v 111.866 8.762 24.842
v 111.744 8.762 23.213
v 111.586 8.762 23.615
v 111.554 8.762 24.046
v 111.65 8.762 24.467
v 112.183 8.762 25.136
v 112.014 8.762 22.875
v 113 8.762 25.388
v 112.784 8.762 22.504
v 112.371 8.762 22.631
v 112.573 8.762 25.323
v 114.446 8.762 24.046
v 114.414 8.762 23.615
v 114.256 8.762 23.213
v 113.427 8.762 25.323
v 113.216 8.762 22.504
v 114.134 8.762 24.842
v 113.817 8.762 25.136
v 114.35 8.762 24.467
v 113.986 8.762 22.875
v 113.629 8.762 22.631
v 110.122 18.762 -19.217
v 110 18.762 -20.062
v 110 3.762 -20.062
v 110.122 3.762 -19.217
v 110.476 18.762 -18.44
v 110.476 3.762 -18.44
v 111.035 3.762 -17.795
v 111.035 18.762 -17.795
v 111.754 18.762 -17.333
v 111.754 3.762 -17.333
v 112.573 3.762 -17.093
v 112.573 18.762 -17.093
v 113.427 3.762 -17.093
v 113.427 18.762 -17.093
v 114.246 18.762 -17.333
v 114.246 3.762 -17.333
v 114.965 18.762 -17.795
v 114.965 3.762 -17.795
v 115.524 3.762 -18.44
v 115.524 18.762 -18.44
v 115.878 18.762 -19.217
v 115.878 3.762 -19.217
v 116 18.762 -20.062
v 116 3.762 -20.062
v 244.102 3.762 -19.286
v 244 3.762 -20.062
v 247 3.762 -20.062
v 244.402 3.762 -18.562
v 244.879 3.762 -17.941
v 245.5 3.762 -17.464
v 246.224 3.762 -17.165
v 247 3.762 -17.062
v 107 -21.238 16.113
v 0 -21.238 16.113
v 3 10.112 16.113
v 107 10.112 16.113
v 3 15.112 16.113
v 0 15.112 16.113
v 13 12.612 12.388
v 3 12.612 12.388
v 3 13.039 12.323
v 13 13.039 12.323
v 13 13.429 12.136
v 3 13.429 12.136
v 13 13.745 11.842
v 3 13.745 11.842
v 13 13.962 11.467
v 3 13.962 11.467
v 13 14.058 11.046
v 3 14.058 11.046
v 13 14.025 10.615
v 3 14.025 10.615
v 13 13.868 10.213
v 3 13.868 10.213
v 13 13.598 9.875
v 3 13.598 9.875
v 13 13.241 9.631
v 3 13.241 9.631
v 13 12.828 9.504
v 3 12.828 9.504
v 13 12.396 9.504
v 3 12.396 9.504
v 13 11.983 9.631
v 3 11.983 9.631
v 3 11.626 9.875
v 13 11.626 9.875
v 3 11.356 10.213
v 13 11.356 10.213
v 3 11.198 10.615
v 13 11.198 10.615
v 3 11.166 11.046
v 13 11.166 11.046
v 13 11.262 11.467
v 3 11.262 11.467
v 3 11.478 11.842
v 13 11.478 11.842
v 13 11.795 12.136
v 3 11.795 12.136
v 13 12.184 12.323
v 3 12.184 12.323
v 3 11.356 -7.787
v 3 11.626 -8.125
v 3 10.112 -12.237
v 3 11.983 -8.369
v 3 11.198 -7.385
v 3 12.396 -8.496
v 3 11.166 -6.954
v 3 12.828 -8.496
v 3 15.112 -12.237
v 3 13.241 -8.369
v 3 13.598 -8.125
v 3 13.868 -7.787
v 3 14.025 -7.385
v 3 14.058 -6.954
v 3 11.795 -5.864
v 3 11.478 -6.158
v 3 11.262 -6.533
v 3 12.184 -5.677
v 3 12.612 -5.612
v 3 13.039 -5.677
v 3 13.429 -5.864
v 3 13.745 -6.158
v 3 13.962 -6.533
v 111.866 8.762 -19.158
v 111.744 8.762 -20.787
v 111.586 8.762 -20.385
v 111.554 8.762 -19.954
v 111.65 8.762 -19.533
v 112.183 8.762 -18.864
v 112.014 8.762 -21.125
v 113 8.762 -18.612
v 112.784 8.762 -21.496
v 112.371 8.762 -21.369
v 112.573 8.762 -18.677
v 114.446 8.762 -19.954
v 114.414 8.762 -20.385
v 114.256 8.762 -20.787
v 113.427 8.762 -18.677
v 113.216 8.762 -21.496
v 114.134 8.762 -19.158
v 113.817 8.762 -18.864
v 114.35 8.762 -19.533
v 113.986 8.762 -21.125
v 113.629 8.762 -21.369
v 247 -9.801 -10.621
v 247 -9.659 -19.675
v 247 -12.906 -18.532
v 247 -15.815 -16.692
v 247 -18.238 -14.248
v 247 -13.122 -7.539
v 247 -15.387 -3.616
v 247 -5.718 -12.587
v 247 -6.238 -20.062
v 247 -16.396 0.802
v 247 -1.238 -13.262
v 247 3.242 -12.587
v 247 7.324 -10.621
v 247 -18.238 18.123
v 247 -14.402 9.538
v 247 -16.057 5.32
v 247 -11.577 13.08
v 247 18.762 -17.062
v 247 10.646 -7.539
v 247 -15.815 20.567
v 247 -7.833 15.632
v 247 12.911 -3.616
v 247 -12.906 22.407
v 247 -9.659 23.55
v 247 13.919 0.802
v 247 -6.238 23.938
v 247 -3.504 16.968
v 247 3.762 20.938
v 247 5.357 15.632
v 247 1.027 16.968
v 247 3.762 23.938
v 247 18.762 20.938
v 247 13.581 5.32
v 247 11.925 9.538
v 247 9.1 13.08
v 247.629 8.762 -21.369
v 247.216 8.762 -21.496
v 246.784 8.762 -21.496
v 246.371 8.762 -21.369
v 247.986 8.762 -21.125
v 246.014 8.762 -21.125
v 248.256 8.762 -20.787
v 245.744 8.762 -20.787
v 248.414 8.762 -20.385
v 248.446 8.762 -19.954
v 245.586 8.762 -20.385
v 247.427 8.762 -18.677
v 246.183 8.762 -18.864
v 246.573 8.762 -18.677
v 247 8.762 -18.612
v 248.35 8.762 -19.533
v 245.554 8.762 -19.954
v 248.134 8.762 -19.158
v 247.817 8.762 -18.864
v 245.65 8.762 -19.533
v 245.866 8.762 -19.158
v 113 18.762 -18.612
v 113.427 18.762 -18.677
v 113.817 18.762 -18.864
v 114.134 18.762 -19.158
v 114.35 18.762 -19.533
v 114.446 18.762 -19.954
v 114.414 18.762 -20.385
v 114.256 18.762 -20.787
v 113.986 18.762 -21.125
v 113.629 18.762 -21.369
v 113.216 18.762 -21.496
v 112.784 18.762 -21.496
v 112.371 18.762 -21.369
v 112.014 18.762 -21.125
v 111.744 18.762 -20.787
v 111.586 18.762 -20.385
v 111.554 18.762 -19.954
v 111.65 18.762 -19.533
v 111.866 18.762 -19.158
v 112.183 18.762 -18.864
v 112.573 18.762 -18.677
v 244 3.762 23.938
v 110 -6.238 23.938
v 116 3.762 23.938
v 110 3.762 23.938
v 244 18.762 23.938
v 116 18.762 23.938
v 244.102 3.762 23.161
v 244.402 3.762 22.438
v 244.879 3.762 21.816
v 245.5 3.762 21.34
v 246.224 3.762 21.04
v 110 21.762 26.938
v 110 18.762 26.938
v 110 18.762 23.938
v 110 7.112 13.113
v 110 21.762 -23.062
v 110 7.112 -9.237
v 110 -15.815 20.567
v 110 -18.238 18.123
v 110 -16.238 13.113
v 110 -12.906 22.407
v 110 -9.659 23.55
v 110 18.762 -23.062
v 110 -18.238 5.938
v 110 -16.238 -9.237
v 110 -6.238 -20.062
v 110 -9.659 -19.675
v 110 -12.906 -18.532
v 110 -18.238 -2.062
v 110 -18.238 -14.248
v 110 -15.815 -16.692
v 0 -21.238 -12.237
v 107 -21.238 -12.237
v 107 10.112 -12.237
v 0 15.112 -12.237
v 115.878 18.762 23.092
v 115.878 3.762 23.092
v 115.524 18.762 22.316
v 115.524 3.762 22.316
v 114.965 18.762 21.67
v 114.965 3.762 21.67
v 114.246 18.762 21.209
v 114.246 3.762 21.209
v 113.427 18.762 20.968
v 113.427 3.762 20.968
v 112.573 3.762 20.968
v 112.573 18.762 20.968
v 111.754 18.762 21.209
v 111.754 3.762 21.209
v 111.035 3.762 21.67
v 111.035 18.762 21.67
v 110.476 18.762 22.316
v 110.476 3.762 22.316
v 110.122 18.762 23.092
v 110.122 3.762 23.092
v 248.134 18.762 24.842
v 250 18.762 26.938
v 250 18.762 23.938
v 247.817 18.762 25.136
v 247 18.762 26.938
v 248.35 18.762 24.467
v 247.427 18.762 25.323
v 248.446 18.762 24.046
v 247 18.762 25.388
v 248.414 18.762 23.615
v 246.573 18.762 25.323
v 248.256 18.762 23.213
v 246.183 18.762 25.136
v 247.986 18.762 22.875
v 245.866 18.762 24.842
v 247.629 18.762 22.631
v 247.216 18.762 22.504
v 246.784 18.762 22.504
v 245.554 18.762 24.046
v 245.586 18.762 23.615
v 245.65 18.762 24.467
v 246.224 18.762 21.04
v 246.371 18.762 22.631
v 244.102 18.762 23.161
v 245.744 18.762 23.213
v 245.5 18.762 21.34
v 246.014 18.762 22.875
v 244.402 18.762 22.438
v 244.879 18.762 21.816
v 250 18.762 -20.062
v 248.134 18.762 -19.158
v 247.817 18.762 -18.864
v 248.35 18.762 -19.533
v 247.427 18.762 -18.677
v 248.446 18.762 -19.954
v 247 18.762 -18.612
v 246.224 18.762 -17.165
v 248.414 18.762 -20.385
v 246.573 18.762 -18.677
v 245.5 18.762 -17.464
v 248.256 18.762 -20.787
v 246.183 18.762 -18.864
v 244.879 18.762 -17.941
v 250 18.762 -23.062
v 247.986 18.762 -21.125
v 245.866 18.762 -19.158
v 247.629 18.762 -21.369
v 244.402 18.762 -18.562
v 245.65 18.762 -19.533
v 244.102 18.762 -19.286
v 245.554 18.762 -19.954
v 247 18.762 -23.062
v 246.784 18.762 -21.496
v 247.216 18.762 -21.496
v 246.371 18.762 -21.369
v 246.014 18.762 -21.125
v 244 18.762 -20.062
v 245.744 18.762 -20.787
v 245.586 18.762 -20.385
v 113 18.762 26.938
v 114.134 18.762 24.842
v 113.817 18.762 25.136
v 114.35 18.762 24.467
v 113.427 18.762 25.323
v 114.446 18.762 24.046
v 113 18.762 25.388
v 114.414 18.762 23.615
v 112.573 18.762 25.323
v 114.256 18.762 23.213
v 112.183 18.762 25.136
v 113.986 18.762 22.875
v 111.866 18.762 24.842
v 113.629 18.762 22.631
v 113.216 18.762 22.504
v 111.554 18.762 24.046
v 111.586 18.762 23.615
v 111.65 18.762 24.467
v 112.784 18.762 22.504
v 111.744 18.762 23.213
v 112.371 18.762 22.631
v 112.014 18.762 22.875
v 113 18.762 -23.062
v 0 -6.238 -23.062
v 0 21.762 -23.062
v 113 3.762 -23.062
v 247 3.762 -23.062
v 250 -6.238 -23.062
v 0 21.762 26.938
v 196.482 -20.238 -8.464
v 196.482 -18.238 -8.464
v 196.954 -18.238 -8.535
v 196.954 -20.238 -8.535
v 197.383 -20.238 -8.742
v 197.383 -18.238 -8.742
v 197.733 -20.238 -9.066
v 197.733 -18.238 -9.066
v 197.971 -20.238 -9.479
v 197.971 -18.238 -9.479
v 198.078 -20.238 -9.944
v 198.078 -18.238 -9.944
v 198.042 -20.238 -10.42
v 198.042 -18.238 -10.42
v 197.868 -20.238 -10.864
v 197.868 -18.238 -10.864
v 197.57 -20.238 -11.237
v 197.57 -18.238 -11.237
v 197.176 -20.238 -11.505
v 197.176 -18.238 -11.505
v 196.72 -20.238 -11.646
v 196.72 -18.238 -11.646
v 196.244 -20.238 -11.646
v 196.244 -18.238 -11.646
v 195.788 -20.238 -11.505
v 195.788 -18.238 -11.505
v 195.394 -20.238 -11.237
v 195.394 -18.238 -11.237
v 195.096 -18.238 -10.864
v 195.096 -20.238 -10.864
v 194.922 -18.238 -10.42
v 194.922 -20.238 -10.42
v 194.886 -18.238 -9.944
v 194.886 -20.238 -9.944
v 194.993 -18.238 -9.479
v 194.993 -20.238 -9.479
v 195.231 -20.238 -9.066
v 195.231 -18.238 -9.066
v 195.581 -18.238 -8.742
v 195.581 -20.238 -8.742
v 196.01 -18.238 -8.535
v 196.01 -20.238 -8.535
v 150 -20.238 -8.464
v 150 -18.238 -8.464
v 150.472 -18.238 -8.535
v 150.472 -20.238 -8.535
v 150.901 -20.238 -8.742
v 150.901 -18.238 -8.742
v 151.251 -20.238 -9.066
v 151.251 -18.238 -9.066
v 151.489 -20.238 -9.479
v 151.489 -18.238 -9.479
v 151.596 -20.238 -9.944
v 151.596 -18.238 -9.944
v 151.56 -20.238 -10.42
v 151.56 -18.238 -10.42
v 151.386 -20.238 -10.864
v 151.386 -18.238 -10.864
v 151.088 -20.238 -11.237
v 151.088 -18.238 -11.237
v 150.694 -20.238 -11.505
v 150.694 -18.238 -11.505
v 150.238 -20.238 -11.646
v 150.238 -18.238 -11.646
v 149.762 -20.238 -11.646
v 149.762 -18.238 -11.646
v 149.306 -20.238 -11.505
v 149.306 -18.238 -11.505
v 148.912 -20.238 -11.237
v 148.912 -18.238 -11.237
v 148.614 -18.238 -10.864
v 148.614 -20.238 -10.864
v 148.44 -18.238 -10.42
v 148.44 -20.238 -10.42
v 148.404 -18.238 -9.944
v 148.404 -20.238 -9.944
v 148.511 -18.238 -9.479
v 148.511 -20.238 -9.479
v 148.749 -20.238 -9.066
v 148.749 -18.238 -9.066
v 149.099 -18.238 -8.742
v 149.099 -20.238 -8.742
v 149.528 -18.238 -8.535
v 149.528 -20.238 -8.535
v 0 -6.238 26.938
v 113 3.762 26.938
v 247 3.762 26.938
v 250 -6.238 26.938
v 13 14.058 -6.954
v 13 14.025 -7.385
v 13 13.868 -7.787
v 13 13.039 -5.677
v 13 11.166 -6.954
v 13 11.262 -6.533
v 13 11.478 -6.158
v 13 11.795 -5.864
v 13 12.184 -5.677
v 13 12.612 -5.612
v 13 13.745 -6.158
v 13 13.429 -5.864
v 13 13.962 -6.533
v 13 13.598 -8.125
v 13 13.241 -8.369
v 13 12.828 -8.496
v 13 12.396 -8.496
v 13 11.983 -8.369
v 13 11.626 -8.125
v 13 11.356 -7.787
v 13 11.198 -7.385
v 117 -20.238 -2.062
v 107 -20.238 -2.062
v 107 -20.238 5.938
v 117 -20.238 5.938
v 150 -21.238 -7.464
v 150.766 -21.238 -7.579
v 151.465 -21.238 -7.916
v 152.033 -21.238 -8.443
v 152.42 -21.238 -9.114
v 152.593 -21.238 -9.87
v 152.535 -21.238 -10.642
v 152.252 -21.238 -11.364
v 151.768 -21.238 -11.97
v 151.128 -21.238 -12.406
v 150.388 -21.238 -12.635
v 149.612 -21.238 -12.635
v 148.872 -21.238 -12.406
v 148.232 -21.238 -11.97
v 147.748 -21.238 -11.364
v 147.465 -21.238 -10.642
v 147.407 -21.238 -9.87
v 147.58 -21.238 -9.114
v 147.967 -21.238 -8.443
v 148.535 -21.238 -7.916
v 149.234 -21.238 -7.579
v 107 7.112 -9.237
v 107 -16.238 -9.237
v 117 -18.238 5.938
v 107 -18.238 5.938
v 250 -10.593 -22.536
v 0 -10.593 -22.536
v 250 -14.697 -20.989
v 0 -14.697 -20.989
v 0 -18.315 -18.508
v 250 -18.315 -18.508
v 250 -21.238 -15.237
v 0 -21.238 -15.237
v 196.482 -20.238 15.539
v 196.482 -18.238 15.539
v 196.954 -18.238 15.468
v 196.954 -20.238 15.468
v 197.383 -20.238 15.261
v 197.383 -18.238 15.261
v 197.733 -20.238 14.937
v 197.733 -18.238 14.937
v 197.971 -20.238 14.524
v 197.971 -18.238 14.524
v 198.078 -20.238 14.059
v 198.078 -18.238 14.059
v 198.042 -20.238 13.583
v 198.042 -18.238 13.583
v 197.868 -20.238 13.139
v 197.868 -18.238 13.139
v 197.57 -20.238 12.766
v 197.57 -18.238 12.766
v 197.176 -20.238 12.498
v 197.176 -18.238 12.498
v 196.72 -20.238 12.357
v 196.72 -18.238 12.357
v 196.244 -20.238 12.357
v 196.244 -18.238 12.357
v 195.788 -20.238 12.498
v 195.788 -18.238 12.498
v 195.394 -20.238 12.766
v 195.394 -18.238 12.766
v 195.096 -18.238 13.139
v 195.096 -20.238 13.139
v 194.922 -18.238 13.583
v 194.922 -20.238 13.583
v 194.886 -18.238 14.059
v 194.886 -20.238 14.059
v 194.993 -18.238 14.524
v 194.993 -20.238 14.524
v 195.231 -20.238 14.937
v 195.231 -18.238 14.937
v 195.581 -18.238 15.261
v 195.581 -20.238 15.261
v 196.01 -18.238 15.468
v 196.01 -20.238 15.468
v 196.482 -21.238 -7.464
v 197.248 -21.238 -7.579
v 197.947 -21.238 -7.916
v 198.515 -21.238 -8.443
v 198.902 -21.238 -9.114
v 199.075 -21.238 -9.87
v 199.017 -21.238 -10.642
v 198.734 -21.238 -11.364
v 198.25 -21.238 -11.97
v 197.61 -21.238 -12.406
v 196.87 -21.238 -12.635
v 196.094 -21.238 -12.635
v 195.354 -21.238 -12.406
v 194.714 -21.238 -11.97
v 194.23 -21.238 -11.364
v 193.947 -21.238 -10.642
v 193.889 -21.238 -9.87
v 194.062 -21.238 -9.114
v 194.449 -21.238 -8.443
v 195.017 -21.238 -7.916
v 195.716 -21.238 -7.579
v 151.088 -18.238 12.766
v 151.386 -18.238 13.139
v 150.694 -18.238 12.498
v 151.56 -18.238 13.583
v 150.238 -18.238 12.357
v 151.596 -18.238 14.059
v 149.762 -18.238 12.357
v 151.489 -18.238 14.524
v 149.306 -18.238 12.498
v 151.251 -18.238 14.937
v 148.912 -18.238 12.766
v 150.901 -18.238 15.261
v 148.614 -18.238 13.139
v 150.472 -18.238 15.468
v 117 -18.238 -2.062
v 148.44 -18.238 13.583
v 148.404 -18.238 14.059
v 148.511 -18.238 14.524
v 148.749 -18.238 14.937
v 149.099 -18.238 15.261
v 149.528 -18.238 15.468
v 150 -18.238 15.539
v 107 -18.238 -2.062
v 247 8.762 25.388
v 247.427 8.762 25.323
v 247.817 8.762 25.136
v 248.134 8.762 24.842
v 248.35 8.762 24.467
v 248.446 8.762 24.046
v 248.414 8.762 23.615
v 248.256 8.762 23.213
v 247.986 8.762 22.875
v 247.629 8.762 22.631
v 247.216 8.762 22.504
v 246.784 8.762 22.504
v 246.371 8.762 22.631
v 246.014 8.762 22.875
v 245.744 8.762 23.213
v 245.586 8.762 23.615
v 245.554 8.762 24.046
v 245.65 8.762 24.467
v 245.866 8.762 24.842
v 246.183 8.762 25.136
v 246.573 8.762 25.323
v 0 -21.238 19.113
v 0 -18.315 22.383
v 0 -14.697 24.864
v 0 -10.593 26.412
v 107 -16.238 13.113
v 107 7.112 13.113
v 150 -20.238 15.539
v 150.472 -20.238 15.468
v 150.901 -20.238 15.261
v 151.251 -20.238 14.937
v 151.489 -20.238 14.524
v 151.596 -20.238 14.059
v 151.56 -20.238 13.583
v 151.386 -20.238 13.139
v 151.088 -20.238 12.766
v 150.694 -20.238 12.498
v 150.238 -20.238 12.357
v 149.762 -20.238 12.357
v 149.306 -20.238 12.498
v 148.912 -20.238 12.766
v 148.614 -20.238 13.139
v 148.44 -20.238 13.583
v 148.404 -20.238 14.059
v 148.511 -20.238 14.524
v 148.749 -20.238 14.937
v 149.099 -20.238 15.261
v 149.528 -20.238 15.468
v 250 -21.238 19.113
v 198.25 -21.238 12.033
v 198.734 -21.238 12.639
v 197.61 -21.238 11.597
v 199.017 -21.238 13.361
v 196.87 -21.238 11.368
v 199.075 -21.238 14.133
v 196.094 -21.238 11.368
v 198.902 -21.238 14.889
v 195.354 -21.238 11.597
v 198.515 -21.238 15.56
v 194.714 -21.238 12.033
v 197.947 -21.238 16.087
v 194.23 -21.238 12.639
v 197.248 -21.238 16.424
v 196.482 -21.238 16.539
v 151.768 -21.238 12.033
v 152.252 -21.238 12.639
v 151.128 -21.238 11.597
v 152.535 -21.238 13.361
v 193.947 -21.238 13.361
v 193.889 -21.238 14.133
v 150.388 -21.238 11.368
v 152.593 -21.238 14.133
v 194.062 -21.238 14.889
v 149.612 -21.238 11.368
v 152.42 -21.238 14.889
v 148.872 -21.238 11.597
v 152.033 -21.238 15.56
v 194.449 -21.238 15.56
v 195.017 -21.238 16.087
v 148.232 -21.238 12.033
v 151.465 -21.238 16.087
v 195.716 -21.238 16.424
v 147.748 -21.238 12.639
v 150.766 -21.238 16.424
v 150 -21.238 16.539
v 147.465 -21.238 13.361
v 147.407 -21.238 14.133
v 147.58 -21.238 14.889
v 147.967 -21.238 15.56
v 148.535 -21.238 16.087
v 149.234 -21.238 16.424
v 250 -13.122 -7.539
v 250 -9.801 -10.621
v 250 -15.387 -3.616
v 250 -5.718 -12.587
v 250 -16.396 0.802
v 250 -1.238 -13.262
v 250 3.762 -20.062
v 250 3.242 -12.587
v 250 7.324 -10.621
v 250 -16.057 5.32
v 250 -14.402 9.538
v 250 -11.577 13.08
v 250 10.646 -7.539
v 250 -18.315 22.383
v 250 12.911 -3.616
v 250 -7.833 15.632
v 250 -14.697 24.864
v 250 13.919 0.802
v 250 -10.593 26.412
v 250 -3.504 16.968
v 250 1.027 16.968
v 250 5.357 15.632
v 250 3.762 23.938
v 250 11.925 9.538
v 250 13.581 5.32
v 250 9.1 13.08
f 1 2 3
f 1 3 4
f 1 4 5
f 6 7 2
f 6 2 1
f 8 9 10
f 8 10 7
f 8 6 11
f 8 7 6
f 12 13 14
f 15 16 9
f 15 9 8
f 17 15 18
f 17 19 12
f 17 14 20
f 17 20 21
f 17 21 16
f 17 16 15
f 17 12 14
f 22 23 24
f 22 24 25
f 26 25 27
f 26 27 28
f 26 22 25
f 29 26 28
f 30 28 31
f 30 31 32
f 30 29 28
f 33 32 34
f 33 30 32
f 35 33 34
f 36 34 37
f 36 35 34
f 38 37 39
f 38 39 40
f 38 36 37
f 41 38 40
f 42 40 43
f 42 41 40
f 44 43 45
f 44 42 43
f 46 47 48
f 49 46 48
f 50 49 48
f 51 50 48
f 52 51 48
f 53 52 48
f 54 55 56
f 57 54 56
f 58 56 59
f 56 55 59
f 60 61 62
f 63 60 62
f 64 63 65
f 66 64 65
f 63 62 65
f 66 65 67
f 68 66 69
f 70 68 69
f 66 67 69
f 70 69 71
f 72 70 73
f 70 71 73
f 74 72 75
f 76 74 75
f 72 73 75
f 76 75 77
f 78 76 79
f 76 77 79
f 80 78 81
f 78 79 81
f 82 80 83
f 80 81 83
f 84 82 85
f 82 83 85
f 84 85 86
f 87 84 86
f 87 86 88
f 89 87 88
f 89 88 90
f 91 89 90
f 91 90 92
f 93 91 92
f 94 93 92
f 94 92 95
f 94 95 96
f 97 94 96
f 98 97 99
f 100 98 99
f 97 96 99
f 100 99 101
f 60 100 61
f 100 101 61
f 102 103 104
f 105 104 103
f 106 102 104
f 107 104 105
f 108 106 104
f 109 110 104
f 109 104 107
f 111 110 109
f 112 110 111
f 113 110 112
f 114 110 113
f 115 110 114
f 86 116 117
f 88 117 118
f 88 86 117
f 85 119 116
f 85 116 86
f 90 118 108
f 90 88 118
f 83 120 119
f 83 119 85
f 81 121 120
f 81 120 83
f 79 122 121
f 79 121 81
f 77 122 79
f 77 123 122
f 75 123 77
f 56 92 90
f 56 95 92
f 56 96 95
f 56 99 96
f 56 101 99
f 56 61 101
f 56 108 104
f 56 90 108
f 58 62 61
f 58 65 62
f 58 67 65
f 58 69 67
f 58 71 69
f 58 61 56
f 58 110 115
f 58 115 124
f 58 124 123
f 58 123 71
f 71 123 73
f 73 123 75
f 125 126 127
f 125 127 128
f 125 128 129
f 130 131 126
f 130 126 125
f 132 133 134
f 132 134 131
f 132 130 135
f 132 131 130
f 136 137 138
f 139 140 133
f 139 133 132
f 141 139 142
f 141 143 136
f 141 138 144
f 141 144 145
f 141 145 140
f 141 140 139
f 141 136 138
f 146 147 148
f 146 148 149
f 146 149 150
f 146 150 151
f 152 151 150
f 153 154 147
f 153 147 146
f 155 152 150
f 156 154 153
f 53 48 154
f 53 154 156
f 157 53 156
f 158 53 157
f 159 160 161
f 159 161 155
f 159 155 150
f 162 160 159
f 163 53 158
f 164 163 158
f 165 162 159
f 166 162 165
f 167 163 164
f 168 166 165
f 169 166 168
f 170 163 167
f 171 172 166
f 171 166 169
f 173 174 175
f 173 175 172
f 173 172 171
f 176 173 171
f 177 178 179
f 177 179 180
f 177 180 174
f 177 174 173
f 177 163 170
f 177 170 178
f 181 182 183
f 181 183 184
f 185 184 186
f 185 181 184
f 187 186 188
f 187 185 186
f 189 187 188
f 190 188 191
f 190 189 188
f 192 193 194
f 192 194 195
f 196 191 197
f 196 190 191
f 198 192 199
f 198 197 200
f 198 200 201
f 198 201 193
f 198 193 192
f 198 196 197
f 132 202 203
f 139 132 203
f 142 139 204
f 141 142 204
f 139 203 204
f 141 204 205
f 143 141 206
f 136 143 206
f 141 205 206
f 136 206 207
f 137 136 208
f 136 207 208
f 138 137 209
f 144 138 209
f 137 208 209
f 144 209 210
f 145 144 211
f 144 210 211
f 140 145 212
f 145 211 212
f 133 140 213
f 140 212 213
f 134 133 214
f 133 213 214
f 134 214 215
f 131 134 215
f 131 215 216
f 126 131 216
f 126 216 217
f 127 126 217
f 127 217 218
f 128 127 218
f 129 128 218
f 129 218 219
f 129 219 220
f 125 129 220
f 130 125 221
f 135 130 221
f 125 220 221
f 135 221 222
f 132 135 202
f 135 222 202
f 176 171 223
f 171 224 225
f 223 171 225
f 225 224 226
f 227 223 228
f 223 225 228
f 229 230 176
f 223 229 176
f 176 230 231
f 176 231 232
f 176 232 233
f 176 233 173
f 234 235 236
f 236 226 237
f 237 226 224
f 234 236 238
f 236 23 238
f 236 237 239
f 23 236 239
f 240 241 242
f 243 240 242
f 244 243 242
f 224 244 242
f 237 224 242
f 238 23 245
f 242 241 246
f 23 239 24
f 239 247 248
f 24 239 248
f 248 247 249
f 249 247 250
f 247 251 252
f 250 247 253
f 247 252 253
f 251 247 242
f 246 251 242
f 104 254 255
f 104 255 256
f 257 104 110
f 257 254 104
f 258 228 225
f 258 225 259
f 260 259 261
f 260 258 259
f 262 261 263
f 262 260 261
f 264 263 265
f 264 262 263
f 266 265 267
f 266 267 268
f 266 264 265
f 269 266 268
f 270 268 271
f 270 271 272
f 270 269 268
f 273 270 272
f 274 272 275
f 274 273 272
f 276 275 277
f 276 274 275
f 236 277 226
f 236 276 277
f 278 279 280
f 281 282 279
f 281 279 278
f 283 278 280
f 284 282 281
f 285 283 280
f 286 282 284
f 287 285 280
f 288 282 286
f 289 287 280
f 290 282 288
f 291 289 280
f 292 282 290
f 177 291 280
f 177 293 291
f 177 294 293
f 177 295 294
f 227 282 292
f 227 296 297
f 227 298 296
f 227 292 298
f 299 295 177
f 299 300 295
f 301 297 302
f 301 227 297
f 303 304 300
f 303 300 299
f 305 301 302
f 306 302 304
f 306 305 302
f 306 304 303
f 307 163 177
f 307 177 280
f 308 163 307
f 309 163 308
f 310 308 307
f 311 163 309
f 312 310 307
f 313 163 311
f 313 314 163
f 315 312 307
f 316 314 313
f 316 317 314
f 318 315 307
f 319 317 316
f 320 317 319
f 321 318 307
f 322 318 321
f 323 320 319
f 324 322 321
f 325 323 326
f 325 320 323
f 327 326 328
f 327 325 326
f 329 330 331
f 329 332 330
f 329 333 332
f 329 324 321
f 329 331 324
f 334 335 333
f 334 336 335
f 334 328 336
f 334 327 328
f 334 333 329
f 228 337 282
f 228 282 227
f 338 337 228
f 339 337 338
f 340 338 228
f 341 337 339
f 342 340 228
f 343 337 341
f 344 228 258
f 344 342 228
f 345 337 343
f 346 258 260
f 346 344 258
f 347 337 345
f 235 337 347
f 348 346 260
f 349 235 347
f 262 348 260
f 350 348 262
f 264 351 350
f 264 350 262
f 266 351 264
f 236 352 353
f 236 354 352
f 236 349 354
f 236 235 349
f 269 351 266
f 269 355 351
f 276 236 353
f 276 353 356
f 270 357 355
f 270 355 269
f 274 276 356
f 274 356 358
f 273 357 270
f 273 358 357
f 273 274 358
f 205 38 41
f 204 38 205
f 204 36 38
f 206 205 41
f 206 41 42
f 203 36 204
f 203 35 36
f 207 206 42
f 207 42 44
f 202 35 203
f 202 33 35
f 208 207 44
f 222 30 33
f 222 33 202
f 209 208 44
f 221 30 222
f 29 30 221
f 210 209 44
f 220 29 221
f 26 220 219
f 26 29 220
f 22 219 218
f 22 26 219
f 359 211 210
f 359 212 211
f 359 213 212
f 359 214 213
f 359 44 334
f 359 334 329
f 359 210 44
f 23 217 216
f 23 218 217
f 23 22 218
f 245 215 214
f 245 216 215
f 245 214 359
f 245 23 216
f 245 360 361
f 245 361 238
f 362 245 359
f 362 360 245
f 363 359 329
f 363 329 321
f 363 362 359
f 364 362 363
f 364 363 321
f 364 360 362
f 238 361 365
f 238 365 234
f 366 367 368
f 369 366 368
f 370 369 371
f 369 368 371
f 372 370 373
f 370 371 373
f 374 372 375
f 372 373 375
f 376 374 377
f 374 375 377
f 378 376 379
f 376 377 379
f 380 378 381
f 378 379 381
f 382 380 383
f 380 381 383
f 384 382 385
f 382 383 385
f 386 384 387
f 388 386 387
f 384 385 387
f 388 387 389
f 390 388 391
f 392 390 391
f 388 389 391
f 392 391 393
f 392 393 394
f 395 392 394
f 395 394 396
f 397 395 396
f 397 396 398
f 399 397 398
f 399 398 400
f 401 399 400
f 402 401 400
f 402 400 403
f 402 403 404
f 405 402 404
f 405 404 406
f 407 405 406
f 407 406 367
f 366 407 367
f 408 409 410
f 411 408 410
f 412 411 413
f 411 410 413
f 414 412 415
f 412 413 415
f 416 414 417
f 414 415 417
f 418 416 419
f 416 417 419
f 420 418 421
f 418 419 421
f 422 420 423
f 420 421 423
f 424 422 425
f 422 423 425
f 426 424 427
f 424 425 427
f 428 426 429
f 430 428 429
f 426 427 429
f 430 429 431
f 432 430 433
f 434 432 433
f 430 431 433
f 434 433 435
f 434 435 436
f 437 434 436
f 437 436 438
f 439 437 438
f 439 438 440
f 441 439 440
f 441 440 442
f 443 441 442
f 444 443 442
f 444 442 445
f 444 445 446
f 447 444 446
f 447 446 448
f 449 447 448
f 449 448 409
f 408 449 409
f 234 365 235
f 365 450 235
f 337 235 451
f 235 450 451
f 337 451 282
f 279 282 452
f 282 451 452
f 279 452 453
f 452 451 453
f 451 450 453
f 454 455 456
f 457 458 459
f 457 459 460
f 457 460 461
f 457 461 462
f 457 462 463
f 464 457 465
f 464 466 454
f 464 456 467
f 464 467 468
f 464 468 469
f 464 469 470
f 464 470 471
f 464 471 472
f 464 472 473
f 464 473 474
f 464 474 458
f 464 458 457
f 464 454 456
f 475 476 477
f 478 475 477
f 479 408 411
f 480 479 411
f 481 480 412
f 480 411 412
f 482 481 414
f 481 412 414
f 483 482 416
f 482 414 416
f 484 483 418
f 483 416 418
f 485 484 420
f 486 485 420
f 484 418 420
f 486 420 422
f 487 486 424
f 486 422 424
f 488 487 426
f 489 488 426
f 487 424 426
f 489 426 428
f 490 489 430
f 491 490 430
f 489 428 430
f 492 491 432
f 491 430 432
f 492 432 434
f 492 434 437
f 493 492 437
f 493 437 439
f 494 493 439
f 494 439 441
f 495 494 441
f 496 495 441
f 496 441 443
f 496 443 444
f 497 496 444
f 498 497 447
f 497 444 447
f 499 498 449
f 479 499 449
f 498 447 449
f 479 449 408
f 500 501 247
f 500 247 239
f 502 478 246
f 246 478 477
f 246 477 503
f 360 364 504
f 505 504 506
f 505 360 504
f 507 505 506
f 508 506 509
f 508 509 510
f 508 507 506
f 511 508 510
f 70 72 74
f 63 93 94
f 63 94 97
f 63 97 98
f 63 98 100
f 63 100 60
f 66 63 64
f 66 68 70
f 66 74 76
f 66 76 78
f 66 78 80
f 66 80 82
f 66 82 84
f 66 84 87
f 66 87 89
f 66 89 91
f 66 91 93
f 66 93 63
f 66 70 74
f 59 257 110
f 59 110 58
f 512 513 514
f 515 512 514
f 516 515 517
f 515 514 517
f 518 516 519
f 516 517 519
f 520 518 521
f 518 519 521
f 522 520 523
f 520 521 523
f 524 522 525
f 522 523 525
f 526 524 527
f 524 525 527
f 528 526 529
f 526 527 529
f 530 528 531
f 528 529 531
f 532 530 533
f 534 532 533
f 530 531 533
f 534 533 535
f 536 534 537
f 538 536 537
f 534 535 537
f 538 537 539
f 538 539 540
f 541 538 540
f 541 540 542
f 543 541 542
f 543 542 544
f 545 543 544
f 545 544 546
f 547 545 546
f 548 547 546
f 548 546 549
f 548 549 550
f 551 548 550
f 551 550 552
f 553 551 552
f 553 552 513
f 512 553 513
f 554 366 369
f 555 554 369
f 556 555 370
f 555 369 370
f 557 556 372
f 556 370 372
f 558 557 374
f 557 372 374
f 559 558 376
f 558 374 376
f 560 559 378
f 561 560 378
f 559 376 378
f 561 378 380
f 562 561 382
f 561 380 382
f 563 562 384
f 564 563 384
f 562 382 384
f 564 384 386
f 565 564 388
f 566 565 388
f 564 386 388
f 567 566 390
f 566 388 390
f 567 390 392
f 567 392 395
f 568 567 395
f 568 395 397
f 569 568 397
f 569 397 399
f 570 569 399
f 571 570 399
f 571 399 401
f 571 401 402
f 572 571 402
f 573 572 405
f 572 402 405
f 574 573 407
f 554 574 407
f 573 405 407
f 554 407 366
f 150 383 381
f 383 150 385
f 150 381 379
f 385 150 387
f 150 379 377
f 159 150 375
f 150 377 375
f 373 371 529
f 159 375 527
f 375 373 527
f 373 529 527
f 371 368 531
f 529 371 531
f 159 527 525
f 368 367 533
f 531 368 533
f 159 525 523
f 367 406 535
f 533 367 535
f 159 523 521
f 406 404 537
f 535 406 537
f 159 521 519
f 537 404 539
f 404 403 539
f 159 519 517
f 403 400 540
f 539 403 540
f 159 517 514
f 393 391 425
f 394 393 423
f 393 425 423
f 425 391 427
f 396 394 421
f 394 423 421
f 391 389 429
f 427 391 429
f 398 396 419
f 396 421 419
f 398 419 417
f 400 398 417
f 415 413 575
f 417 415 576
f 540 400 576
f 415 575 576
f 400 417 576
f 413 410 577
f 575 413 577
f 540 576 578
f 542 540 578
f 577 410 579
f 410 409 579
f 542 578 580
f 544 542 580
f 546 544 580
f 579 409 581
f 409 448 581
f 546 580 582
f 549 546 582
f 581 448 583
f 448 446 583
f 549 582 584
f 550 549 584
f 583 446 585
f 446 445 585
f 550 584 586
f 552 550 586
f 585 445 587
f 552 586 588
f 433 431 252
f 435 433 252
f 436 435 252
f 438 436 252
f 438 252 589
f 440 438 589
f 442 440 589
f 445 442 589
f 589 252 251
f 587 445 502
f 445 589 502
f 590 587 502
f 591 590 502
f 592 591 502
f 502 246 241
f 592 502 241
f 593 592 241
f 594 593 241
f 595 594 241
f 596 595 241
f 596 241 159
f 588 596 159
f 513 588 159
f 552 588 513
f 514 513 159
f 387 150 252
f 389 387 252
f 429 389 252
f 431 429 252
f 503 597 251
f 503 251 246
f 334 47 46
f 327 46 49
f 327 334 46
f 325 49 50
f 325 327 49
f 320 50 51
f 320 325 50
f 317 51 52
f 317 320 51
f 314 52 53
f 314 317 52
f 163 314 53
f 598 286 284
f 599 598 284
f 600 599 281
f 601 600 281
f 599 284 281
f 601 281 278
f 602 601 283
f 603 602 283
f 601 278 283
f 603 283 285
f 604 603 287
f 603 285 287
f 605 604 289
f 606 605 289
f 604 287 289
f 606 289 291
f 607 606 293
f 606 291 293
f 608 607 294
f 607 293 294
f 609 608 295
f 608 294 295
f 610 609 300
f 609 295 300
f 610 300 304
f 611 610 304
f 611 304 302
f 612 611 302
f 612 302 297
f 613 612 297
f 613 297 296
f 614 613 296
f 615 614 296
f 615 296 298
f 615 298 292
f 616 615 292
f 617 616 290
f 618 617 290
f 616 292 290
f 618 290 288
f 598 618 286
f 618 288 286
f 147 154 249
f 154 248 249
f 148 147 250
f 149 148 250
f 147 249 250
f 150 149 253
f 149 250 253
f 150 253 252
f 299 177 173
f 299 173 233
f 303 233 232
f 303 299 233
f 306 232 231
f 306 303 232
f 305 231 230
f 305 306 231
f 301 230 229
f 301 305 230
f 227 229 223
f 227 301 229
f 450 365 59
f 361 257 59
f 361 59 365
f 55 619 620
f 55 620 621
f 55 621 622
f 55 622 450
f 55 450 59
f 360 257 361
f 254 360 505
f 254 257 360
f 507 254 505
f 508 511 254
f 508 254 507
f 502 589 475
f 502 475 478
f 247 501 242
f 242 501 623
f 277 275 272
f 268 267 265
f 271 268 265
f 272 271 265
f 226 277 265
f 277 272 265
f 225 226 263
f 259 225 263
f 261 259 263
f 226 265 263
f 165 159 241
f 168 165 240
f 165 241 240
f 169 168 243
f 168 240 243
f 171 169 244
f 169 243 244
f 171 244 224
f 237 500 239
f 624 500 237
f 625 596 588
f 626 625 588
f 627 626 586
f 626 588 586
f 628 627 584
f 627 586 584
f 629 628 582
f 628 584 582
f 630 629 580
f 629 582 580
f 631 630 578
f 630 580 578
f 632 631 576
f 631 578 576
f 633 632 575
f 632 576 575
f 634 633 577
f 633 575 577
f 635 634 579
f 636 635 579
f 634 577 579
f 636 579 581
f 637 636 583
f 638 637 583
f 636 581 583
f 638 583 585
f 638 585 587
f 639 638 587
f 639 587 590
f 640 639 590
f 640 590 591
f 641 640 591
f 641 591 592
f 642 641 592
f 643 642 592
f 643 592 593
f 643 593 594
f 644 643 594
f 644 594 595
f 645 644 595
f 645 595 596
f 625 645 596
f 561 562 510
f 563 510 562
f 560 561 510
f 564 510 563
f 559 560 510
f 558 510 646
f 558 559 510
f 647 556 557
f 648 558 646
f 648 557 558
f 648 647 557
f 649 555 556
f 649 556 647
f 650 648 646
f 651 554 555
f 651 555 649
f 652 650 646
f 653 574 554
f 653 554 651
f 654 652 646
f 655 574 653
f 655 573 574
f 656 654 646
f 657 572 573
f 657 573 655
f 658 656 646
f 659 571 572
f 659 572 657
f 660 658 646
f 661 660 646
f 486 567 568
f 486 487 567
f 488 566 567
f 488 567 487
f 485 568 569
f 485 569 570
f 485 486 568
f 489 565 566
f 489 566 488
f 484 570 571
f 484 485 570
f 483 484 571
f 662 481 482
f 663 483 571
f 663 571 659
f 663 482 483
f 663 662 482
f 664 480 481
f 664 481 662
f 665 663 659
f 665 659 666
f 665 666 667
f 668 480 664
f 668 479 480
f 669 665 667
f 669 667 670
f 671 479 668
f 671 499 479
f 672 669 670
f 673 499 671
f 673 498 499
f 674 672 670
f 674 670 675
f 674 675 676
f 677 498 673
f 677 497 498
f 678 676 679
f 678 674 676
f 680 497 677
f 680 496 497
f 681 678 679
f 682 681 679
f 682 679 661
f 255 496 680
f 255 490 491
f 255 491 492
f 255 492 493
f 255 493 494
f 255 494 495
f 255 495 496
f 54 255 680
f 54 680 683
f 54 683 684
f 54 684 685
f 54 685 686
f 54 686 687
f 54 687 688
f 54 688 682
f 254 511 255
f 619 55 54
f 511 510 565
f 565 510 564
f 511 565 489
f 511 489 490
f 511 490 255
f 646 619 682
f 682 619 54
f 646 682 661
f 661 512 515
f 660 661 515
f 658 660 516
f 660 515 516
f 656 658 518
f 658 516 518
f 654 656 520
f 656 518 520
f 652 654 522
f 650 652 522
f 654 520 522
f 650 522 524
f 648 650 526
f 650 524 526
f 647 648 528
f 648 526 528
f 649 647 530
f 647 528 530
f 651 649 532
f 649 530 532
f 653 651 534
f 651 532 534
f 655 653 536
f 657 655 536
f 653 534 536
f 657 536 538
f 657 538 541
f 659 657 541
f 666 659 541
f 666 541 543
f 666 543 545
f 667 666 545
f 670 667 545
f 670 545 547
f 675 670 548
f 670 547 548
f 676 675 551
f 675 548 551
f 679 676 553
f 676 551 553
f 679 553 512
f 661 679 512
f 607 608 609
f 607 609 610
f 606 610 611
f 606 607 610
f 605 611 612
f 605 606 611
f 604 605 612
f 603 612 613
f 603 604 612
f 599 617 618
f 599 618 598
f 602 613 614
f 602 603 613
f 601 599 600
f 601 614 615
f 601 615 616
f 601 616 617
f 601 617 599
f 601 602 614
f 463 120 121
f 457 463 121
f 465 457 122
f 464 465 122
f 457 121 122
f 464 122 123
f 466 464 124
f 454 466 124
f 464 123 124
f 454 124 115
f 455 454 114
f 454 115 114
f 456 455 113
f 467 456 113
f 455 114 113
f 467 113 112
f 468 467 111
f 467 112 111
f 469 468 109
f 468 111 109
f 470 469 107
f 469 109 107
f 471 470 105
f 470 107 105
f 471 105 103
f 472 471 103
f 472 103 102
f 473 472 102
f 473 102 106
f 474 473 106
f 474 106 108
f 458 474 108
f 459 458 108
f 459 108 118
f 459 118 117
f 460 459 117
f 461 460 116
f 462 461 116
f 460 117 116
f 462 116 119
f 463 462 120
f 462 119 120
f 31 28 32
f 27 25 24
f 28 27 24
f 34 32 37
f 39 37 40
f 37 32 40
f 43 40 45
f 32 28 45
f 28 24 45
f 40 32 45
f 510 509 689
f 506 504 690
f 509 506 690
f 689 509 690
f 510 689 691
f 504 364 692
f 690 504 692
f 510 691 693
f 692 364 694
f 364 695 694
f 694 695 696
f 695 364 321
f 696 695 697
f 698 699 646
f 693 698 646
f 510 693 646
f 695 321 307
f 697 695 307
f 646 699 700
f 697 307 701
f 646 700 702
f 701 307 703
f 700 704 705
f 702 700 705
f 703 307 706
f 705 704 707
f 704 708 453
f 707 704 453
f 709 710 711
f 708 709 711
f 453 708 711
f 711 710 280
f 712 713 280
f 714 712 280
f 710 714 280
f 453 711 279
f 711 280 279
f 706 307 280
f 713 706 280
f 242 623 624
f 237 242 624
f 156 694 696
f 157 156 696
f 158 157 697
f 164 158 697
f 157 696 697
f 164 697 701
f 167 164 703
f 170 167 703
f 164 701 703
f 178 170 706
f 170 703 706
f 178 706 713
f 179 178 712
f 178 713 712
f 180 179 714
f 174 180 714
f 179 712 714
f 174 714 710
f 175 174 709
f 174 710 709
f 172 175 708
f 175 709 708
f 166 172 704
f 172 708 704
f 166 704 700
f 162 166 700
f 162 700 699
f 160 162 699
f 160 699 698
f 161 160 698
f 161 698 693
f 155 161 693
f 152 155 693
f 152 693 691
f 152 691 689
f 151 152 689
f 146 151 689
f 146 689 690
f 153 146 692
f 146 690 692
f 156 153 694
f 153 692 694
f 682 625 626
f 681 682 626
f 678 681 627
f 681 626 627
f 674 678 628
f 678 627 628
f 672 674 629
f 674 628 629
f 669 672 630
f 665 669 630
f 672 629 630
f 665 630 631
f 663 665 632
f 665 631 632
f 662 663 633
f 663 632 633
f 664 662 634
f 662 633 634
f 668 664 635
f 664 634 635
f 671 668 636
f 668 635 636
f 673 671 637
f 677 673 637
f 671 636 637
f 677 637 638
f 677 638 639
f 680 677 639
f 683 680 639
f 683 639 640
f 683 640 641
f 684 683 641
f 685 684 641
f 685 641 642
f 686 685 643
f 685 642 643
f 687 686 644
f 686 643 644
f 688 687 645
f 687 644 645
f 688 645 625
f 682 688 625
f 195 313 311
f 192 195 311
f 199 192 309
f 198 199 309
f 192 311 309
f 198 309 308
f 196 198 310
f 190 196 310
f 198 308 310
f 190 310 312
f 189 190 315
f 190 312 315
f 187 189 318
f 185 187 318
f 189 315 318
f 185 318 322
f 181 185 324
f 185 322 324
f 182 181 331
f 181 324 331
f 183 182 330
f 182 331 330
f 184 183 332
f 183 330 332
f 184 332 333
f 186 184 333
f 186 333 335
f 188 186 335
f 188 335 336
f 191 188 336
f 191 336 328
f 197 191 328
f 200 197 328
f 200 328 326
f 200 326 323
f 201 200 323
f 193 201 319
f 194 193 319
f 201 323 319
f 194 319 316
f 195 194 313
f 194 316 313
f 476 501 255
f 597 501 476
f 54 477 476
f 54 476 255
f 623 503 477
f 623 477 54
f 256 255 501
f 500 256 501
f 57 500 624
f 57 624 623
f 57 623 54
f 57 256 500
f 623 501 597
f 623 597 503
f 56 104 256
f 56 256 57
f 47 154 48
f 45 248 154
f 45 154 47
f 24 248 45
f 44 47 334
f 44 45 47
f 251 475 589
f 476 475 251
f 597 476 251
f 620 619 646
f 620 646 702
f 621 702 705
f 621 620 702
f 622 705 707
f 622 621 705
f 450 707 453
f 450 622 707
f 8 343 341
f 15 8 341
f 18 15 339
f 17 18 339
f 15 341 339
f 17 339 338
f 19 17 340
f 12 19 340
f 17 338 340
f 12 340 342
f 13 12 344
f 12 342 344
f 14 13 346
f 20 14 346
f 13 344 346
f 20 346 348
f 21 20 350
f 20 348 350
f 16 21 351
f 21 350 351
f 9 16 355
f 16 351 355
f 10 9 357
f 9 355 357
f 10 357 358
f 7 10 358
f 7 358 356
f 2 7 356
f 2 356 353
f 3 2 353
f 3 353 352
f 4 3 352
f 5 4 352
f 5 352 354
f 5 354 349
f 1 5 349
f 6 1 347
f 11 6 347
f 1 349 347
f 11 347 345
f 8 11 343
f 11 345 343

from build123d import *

# Parameters (mm, degrees)
SKETCH1_W           = 50
SKETCH1_H           = 25
BOSS_EXTRUDE1_DEPTH = 250
SHELL1_T            = -3
SKETCH2_W           = 50
SKETCH2_H           = 25
BOSS_EXTRUDE2_DEPTH = 110
SKETCH3_W           = 28.35
SKETCH3_H           = 31.35
CUT_EXTRUDE1_DEPTH  = 107
SKETCH4_W           = 28.35
SKETCH4_H           = 5
CUT_EXTRUDE2_DEPTH  = 3
SKETCH5_R           = 1.45
CUT_EXTRUDE3_DEPTH  = 10
SKETCH6_W           = 8
SKETCH6_H           = 2
CUT_EXTRUDE4_DEPTH  = 10
SKETCH7_W           = 22.35
SKETCH7_H           = 23.35
CUT_EXTRUDE5_DEPTH  = 10
SKETCH9_W           = 110
SKETCH9_H           = 50
BOSS_EXTRUDE3_DEPTH = 3
SKETCH10_R          = 15.2
CUT_EXTRUDE6_DEPTH  = 3
SKETCH11_R          = 3
BOSS_EXTRUDE4_DEPTH = 15
SKETCH12_R          = 1.45
CUT_EXTRUDE7_DEPTH  = 10
SKETCH13_R          = 1.6
CUT_EXTRUDE8_DEPTH  = 10
CHAMFER1_SIZE       = 1


with BuildPart() as part:
    # Sketch1 → Boss-Extrude1 (new body)
    with BuildSketch(Plane(origin=(0, 0, 0), x_dir=(0, 0, -1), z_dir=(1, 0, 0))):
        with BuildLine():
            ThreePointArc((23.062381853, -6.238185255), (20.988557625, -14.697361116), (15.237381853, -21.238185255))
            Line((15.237381853, -21.238185255), (-19.112618147, -21.238185255))
            ThreePointArc((-19.112618147, -21.238185255), (-24.86379392, -14.697361116), (-26.937618147, -6.238185255))
            Line((-26.937618147, -6.238185255), (23.062381853, -6.238185255))
        make_face()
        with Locations((-1.937618147, 6.261814745)):
            Rectangle(SKETCH1_W, SKETCH1_H)
    extrude(amount=BOSS_EXTRUDE1_DEPTH)

    # Shell1
    shell1_openings = [part.faces().sort_by_distance(p)[0] for p in [
        (125, 18.761814745, 1.937618147),
    ]]
    offset(amount=SHELL1_T, openings=shell1_openings, kind=Kind.INTERSECTION)

    # Sketch2 → Boss-Extrude2 (add)
    with BuildSketch(Plane.ZY):
        with Locations((1.937618147, 6.261814745)):
            Rectangle(SKETCH2_W, SKETCH2_H)
        with BuildLine():
            Line((-23.062381853, -6.238185255), (26.937618147, -6.238185255))
            ThreePointArc((26.937618147, -6.238185255), (24.86379392, -14.697361116), (19.112618147, -21.238185255))
            Line((19.112618147, -21.238185255), (-15.237381853, -21.238185255))
            ThreePointArc((-15.237381853, -21.238185255), (-20.988557625, -14.697361116), (-23.062381853, -6.238185255))
        make_face()
    extrude(amount=-BOSS_EXTRUDE2_DEPTH)

    # Sketch3 → Cut-Extrude1 (cut)
    with BuildSketch(Plane.ZY):
        with Locations((1.937618147, -5.563185255)):
            Rectangle(SKETCH3_W, SKETCH3_H)
    extrude(amount=-CUT_EXTRUDE1_DEPTH, mode=Mode.SUBTRACT)

    # Sketch4 → Cut-Extrude2 (cut)
    with BuildSketch(Plane.ZY):
        with Locations((1.937618147, 12.611814745)):
            Rectangle(SKETCH4_W, SKETCH4_H)
    extrude(amount=-CUT_EXTRUDE2_DEPTH, mode=Mode.SUBTRACT)

    # Sketch5 → Cut-Extrude3 (cut)
    with BuildSketch(Plane.ZY.offset(-3)):
        with Locations((-7.062381853, 12.611814745)):
            Circle(SKETCH5_R)
        with Locations((10.937618147, 12.611814745)):
            Circle(SKETCH5_R)
    extrude(amount=-CUT_EXTRUDE3_DEPTH, mode=Mode.SUBTRACT)

    # Sketch6 → Cut-Extrude4 (cut)
    with BuildSketch(Plane.ZY.offset(-107)):
        with Locations((1.937618147, -19.238185255)):
            Rectangle(SKETCH6_W, SKETCH6_H)
    extrude(amount=-CUT_EXTRUDE4_DEPTH, mode=Mode.SUBTRACT)

    # Sketch7 → Cut-Extrude5 (cut)
    with BuildSketch(Plane.ZY.offset(-107)):
        with Locations((1.937618147, -4.563185255)):
            Rectangle(SKETCH7_W, SKETCH7_H)
    extrude(amount=-CUT_EXTRUDE5_DEPTH, mode=Mode.SUBTRACT)

    # Sketch9 → Boss-Extrude3 (add)
    with BuildSketch(Plane(origin=(0, 18.761814745, 0), x_dir=(1, 0, 0), z_dir=(0, 1, 0))):
        with Locations((55, -1.937618147)):
            Rectangle(SKETCH9_W, SKETCH9_H)
    extrude(amount=BOSS_EXTRUDE3_DEPTH)

    # Sketch10 → Cut-Extrude6 (cut)
    with BuildSketch(Plane(origin=(250, 0, 0), x_dir=(0, 0, -1), z_dir=(1, 0, 0))):
        with Locations((-1.937618147, -1.238185255)):
            Circle(SKETCH10_R)
    extrude(amount=-CUT_EXTRUDE6_DEPTH, mode=Mode.SUBTRACT)

    # Sketch11 → Boss-Extrude4 (add)
    with BuildSketch(Plane(origin=(0, 18.761814745, 0), x_dir=(1, 0, 0), z_dir=(0, 1, 0))):
        with Locations((247, -23.937618147)):
            Circle(SKETCH11_R)
        with Locations((247, 20.062381853)):
            Circle(SKETCH11_R)
        with Locations((113, 20.062381853)):
            Circle(SKETCH11_R)
        with Locations((113, -23.937618147)):
            Circle(SKETCH11_R)
    extrude(amount=-BOSS_EXTRUDE4_DEPTH)

    # Sketch12 → Cut-Extrude7 (cut)
    with BuildSketch(Plane(origin=(0, 18.761814745, 0), x_dir=(1, 0, 0), z_dir=(0, 1, 0))):
        with Locations(Location((113, 20.062381853, 0), (0, 0, 270))):
            Circle(SKETCH12_R)
        with Locations(Location((113, -23.937618147, 0), (0, 0, 270))):
            Circle(SKETCH12_R)
        with Locations(Location((247, -23.937618147, 0), (0, 0, 270))):
            Circle(SKETCH12_R)
        with Locations(Location((247, 20.062381853, 0), (0, 0, 270))):
            Circle(SKETCH12_R)
    extrude(amount=-CUT_EXTRUDE7_DEPTH, mode=Mode.SUBTRACT)

    # Sketch13 → Cut-Extrude8 (cut)
    with BuildSketch(Plane(origin=(0, -18.238185255, 0), x_dir=(1, 0, 0), z_dir=(0, 1, 0))):
        with Locations(Location((150, 10.063881853, 0), (0, 0, 270))):
            Circle(SKETCH13_R)
        with Locations(Location((150, -13.939118147, 0), (0, 0, 270))):
            Circle(SKETCH13_R)
        with Locations(Location((196.482, -13.939118147, 0), (0, 0, 270))):
            Circle(SKETCH13_R)
        with Locations(Location((196.482, 10.063881853, 0), (0, 0, 270))):
            Circle(SKETCH13_R)
    extrude(amount=-CUT_EXTRUDE8_DEPTH, mode=Mode.SUBTRACT)

    # Chamfer1
    chamfer1_edges = [part.edges().sort_by_distance(p)[0] for p in [
        (196.482, -21.238185255, -11.663881853),
        (196.482, -21.238185255, 12.339118147),
        (150, -21.238185255, 12.339118147),
        (150, -21.238185255, -11.663881853),
    ]]
    chamfer(chamfer1_edges, length=CHAMFER1_SIZE)


solid = part.part
